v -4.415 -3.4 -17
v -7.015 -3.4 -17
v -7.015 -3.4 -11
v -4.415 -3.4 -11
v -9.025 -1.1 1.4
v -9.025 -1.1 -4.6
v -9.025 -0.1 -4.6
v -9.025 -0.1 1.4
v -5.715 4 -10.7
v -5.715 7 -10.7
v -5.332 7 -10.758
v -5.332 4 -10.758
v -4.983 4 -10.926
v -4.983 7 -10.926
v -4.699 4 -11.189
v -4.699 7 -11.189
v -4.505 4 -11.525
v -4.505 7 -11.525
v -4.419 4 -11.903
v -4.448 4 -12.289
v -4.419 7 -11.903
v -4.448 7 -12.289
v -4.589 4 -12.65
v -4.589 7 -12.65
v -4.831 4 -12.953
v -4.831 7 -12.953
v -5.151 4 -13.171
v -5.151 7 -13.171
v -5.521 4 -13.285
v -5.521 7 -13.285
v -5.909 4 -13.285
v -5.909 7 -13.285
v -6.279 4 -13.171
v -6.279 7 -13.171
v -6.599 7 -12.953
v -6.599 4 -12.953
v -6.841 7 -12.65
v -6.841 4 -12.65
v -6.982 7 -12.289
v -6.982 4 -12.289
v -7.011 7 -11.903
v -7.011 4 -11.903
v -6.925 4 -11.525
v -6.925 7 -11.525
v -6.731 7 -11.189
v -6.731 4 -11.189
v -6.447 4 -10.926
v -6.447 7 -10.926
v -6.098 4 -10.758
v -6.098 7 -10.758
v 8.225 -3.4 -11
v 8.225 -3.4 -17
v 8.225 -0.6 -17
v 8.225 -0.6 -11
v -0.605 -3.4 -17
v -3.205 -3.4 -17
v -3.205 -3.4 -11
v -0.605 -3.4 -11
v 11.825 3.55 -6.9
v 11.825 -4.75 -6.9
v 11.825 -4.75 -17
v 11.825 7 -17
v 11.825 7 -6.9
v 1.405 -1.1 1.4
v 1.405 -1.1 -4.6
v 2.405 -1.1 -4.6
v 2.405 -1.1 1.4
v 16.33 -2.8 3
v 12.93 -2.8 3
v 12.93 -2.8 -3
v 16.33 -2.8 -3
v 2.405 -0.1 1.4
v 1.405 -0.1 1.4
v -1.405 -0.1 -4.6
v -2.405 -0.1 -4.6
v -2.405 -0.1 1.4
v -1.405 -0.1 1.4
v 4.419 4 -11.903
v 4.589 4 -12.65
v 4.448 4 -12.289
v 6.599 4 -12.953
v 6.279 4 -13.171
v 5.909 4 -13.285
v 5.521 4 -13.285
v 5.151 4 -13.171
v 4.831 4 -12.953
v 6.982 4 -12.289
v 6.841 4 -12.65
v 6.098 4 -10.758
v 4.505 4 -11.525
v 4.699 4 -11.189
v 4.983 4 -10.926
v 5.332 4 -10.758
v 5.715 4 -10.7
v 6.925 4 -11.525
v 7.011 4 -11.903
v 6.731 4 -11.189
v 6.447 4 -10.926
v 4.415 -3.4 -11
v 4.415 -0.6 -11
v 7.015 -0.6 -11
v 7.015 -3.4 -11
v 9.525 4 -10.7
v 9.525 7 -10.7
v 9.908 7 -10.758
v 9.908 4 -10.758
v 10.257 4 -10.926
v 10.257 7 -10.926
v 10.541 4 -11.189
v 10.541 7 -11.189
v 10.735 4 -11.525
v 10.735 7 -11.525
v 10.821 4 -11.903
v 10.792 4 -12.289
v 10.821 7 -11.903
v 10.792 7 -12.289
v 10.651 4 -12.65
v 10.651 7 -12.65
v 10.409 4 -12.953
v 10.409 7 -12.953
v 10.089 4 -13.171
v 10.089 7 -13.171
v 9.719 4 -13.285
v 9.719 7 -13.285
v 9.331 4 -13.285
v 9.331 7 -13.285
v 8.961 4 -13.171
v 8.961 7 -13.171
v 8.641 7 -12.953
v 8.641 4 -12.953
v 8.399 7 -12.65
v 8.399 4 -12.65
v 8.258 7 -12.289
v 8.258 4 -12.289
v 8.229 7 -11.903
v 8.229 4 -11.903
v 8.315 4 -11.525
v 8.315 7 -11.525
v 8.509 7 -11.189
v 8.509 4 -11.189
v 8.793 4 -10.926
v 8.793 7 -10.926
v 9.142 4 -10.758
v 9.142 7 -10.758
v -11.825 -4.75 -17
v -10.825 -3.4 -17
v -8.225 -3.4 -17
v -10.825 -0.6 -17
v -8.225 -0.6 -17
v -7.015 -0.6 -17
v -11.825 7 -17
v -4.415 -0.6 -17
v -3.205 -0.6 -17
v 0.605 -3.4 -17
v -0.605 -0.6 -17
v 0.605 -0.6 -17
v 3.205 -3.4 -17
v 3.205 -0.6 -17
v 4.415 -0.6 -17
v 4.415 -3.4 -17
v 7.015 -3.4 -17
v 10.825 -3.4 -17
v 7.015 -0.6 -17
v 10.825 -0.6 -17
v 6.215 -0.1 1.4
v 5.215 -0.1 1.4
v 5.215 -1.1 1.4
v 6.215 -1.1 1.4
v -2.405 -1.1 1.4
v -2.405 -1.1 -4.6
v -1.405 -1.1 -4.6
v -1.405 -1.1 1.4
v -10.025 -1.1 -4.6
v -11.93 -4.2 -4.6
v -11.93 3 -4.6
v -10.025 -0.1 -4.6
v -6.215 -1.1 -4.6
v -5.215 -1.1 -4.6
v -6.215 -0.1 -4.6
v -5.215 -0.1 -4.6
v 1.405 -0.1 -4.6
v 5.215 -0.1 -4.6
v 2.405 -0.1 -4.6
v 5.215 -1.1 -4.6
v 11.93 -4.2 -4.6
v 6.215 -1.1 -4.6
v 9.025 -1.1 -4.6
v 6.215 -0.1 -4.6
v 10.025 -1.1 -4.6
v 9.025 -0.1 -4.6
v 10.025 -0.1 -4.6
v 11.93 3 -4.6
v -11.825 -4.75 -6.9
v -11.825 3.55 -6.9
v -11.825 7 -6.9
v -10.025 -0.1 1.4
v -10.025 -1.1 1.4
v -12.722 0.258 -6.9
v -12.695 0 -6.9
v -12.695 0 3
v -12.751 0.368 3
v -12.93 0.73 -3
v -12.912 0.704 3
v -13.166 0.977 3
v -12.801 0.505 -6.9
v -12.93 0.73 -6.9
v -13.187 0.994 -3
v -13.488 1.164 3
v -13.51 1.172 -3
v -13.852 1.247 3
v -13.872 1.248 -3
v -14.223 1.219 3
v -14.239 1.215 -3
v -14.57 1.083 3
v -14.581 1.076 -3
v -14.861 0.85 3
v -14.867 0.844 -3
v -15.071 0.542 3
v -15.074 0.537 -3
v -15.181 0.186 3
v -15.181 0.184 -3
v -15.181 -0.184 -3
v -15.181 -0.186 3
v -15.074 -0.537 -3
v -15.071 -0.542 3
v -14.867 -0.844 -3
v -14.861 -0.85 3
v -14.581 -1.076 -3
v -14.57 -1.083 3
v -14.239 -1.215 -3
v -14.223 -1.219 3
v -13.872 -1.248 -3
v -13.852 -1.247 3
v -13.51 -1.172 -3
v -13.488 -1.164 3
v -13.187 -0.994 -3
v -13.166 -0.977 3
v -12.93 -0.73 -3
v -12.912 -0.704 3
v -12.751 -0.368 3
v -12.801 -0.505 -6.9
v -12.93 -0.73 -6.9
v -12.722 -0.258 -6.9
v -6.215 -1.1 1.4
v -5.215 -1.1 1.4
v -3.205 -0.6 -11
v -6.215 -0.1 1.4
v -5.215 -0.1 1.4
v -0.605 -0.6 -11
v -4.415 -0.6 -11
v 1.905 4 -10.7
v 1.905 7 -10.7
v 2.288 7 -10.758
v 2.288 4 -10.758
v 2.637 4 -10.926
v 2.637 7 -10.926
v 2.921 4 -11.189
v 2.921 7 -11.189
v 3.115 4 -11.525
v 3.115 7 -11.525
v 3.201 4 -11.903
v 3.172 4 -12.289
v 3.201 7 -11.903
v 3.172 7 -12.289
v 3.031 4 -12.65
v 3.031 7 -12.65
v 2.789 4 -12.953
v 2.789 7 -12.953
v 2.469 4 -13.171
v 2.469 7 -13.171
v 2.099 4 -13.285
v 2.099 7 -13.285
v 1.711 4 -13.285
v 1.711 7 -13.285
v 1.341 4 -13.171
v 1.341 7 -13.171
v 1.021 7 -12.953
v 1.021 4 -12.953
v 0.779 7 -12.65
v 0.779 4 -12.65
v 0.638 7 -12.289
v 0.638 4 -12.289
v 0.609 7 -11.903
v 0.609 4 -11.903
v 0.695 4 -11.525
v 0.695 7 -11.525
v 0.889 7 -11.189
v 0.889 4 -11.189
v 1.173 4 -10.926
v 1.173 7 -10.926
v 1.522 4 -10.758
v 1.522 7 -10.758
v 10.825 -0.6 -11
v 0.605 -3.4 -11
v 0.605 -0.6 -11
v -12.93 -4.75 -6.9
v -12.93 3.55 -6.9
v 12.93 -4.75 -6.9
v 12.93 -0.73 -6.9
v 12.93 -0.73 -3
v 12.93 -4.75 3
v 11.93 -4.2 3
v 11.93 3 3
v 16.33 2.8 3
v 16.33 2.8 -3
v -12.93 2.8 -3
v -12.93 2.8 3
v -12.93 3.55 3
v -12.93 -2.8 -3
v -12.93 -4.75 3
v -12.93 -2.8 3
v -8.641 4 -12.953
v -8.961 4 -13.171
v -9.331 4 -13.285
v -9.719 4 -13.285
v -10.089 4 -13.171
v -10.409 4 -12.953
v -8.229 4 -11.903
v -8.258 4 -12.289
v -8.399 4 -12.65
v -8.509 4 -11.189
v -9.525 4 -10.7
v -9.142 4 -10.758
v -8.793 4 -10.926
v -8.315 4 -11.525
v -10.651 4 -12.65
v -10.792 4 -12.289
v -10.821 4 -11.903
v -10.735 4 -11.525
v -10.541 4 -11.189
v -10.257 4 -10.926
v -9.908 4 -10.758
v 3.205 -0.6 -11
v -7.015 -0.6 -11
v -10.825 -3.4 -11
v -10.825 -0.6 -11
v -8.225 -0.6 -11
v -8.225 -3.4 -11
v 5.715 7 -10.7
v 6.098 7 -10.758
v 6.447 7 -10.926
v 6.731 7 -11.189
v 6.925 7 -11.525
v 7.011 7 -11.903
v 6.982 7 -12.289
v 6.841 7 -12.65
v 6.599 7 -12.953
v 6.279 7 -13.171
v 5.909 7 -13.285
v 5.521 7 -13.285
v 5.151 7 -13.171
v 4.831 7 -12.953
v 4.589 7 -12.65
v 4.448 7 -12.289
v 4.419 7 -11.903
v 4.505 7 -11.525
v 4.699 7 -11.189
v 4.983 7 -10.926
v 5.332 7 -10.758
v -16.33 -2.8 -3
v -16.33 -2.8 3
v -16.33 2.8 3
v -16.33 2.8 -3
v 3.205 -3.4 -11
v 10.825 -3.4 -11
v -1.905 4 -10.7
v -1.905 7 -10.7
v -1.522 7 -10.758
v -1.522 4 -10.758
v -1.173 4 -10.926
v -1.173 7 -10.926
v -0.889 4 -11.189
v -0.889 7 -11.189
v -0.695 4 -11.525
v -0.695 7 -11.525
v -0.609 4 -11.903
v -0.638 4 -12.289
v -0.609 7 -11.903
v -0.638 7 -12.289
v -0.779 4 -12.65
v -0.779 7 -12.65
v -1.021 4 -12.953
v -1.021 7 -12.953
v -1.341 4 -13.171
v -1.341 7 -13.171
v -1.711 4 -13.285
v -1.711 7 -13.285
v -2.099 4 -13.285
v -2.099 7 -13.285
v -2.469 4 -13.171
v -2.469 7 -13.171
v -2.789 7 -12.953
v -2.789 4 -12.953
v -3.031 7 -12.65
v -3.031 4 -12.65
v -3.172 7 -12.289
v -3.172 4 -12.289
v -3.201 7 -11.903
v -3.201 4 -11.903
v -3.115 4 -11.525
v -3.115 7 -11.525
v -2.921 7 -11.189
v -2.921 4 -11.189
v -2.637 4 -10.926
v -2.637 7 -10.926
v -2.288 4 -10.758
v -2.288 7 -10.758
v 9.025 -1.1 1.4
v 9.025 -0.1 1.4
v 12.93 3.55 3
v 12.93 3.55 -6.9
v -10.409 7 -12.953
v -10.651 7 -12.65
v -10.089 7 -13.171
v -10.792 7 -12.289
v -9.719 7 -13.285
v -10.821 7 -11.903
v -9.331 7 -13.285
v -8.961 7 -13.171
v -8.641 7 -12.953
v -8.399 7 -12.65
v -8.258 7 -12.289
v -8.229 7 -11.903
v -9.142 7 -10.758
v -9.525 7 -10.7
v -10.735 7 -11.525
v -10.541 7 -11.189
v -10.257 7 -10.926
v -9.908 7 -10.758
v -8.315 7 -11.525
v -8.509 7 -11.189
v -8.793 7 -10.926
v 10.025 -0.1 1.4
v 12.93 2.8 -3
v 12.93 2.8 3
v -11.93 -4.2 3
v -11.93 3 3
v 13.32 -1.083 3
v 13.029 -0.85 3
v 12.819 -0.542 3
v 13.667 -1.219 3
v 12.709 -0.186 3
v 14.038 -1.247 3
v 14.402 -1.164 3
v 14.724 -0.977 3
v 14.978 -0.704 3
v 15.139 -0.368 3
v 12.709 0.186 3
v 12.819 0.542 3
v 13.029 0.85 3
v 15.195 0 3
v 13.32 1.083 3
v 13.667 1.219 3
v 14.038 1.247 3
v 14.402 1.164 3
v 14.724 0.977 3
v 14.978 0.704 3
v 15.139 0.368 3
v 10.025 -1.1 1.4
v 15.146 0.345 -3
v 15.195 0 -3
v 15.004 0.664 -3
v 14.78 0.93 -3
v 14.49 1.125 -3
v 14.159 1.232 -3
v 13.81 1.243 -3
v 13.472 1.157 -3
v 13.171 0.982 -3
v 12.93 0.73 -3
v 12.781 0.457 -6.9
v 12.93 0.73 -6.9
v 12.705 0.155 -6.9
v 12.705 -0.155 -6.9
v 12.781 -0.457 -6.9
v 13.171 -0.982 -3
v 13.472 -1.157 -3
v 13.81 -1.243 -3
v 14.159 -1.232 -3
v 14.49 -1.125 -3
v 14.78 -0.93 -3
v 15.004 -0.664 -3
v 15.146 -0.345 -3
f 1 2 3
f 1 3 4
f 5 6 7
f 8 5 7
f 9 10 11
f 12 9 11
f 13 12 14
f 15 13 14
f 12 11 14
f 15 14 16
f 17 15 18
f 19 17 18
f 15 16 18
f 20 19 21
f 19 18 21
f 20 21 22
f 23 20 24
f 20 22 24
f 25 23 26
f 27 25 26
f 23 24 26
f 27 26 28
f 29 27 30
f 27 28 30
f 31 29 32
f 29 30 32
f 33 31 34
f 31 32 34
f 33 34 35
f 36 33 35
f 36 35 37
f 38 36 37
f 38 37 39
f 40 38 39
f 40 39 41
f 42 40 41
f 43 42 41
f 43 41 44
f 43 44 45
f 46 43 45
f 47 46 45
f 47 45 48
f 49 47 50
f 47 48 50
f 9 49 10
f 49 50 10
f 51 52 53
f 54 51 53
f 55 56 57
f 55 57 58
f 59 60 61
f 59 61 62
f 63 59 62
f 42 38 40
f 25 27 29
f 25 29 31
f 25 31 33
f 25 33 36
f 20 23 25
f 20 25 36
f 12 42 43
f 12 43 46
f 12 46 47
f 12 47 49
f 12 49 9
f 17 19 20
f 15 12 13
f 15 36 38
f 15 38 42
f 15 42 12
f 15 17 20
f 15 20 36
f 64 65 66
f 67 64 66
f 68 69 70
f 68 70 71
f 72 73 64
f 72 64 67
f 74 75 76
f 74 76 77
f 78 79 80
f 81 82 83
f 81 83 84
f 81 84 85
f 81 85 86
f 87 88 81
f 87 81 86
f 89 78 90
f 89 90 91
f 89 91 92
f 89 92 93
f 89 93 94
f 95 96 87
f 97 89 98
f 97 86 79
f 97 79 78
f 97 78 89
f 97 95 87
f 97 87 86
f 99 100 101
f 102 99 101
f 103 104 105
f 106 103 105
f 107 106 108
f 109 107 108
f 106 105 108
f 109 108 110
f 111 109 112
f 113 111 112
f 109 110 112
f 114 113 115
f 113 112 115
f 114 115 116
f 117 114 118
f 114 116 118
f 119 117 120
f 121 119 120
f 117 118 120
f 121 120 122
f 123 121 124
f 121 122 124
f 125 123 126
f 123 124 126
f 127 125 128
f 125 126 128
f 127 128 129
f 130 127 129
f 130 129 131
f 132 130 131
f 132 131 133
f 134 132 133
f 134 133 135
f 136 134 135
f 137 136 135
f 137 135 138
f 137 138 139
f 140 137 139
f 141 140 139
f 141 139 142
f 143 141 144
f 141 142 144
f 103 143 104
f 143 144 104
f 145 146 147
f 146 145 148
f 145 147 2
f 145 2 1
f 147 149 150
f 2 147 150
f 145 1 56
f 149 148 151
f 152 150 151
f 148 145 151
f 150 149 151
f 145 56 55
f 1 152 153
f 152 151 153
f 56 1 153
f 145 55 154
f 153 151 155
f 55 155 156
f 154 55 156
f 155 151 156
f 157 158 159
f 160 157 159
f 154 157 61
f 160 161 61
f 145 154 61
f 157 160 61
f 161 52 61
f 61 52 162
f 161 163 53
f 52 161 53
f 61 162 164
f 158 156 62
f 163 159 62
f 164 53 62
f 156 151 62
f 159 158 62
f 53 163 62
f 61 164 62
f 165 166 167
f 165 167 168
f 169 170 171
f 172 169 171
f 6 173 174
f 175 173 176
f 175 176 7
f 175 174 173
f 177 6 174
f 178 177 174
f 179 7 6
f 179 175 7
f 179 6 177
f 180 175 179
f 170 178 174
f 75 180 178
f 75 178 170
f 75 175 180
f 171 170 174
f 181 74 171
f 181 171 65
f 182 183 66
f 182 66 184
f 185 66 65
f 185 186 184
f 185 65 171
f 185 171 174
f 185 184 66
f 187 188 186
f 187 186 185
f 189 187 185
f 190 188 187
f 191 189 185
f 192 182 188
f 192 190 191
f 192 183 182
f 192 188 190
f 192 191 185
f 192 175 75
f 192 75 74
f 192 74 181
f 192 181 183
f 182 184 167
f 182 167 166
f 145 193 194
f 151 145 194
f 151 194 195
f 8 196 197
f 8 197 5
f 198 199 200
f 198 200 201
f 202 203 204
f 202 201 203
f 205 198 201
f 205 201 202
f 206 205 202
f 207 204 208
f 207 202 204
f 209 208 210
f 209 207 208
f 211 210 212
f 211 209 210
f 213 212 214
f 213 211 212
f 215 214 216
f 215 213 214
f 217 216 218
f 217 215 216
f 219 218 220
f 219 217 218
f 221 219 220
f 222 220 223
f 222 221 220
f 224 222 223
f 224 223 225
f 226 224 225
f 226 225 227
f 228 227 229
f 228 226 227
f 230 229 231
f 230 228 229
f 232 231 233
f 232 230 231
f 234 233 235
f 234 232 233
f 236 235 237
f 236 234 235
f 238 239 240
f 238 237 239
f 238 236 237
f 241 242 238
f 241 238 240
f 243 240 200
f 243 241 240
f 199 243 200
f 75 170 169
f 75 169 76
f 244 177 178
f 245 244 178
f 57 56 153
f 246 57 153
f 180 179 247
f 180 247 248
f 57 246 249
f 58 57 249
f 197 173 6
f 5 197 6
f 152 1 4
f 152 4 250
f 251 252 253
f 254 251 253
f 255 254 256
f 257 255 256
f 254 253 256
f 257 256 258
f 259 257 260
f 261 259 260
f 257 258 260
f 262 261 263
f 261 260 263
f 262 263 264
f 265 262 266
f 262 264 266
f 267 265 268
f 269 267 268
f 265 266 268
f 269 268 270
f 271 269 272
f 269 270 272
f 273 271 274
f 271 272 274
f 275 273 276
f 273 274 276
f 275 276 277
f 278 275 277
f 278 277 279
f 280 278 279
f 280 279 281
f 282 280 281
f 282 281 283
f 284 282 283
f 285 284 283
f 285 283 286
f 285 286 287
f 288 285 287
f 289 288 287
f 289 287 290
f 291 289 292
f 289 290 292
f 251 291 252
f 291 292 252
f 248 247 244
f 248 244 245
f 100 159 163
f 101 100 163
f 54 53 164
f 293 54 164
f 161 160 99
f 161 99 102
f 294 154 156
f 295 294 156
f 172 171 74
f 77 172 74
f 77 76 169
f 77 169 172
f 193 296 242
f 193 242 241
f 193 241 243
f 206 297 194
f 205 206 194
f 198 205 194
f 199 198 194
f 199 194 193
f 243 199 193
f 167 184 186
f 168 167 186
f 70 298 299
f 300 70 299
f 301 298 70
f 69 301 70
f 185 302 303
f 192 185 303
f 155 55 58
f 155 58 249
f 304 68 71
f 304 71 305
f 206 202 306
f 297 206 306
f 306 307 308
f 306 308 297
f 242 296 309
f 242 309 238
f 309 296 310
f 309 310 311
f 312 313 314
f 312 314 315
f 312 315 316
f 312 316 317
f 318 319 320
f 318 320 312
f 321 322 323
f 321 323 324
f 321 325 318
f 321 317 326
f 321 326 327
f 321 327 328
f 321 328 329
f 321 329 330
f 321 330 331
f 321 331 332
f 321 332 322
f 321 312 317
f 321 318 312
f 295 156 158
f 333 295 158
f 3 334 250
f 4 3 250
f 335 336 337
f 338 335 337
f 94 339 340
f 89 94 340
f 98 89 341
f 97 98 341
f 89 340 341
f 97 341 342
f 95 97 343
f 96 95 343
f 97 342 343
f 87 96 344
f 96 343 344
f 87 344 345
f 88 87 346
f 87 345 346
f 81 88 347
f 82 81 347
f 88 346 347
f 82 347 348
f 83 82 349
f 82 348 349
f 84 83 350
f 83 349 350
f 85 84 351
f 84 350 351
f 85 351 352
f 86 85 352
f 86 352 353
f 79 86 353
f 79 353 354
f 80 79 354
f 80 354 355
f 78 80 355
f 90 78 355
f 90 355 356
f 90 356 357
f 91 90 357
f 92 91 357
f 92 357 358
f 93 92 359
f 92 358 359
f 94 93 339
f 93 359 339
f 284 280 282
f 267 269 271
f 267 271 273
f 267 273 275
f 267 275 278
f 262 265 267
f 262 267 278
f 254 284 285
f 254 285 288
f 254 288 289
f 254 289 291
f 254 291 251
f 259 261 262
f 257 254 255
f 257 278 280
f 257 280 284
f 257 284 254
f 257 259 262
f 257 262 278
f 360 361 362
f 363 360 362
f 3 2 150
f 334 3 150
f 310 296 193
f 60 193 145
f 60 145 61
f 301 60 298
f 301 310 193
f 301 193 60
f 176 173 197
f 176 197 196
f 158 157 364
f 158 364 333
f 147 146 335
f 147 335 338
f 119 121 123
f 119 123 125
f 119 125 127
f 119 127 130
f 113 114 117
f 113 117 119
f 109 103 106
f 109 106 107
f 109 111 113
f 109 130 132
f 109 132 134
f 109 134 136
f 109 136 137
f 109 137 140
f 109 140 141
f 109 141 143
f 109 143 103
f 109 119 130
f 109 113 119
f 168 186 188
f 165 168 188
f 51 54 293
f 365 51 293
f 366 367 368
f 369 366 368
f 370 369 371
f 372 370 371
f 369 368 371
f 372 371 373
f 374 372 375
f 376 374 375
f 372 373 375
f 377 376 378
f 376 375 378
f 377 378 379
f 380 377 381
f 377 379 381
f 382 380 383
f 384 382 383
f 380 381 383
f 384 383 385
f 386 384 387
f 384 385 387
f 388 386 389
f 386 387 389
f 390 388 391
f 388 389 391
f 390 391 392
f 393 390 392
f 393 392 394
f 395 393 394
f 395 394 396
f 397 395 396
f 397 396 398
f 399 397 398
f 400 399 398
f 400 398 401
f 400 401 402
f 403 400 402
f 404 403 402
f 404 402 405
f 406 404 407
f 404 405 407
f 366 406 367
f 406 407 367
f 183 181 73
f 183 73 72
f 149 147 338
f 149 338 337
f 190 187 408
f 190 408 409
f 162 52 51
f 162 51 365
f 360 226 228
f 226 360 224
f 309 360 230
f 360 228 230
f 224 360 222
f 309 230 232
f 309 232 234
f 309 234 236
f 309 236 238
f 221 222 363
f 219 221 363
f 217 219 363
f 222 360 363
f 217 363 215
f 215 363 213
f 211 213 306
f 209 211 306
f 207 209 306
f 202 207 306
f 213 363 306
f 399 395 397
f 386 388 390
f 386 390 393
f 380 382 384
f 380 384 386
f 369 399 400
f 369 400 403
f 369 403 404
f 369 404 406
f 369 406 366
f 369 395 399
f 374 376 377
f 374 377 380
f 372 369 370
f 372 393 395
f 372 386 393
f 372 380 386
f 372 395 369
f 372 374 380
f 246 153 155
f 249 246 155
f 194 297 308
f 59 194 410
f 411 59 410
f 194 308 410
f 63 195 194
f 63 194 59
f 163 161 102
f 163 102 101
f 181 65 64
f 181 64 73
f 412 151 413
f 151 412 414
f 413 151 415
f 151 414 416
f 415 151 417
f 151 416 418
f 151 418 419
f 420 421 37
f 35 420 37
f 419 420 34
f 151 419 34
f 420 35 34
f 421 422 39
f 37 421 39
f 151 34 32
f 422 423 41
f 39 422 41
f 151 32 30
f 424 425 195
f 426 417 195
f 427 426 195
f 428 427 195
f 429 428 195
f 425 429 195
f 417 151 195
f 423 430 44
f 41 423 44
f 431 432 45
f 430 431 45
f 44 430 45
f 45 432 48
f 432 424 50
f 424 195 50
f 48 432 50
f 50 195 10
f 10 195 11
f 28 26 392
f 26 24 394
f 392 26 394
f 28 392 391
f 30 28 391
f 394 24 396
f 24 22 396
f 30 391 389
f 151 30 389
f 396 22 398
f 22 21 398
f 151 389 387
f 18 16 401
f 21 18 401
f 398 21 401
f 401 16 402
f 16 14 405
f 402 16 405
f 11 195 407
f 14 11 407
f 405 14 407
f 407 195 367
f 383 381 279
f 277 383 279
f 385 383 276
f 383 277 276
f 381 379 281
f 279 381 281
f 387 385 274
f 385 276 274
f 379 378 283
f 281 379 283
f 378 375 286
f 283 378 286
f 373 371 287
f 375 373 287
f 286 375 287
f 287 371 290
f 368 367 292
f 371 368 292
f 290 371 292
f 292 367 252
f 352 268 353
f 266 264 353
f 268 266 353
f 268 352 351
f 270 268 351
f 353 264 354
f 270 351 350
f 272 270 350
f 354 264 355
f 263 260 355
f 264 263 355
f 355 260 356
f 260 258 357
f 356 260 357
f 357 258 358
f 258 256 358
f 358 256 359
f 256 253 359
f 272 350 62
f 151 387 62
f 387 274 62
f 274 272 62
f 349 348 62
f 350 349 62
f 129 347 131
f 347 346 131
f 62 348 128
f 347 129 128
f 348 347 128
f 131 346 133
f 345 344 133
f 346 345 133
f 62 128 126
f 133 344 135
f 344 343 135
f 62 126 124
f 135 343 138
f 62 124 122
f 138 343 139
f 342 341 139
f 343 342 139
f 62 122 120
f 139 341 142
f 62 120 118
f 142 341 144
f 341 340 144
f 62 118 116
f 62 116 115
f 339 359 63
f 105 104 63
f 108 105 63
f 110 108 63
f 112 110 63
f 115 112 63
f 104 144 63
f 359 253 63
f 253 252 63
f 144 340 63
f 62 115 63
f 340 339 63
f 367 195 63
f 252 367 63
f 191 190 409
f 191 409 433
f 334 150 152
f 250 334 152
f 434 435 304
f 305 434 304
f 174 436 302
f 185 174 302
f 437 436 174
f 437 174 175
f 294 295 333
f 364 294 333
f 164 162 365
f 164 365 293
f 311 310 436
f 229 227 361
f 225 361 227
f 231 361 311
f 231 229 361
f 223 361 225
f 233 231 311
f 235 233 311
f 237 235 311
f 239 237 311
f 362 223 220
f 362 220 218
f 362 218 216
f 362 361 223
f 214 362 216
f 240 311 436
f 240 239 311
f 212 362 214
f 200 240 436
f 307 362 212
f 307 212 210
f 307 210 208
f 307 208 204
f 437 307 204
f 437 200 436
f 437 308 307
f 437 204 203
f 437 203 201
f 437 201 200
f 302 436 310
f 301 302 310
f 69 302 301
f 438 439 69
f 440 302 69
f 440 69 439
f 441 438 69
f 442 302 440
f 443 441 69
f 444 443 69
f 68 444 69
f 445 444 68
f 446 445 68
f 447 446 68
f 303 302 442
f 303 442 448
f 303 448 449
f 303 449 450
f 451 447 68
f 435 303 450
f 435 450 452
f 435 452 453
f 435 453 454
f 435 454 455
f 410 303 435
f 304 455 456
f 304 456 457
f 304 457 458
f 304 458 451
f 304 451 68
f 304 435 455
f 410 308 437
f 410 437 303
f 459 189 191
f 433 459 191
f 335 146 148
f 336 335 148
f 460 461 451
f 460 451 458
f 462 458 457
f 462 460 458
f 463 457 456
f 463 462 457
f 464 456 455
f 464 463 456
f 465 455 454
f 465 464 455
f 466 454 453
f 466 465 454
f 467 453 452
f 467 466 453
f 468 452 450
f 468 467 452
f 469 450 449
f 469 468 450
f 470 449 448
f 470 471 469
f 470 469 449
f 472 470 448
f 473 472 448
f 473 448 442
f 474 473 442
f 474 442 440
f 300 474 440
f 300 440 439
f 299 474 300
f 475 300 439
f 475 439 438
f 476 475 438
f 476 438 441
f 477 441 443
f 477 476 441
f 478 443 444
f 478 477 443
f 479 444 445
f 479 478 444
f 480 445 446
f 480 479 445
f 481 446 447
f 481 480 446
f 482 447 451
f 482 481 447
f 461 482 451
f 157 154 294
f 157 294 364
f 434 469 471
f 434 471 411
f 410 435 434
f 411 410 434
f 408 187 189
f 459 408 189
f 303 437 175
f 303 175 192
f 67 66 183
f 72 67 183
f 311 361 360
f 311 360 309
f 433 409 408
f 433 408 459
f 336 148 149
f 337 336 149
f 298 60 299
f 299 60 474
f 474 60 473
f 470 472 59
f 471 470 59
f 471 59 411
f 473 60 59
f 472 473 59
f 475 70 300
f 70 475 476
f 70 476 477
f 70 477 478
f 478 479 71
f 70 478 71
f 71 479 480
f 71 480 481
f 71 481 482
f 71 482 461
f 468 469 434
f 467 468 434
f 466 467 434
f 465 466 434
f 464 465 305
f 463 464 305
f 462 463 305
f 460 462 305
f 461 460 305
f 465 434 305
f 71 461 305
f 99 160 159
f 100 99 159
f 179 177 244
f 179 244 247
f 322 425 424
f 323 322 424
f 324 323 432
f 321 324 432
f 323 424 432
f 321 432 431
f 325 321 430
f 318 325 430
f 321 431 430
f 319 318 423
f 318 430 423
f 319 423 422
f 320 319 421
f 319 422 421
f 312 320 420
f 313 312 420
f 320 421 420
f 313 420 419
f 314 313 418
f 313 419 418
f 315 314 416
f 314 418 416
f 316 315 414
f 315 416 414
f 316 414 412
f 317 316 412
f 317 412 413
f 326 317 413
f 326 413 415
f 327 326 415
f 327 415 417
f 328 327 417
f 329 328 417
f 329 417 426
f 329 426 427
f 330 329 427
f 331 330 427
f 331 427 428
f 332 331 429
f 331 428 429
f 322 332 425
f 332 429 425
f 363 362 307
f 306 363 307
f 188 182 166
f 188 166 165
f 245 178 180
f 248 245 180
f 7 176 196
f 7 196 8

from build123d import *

# Parameters (mm, degrees)
SK_SHROUD_W             = 25.86
SK_SHROUD_H             = 8.3
SHROUD_DEPTH            = 9.9
SK_FLANGE_EARS_W        = 3.4
SK_FLANGE_EARS_H        = 5.6
FLANGE_EARS_DEPTH       = 6
SK_CAVITY_W             = 23.86
SK_CAVITY_H             = 7.2
CAVITY_DEPTH            = 7.6
SK_TERMINAL_BLOCK_W     = 23.65
SK_TERMINAL_BLOCK_H     = 11.75
TERMINAL_BLOCK_DEPTH    = 10.1
INSERT_HOLES_DEPTH      = 25.590016267
INSERT_HOLES_DEPTH_BACK = 25.590016267
SK_INSERT_HOLES_R       = 1.25
SK_CONTACT_PINS_W       = 1
SK_CONTACT_PINS_H       = 1
CONTACT_PINS_DEPTH      = 6
SK_WIRE_ENTRIES_W       = 2.6
SK_WIRE_ENTRIES_H       = 2.8
WIRE_ENTRIES_DEPTH      = 6
SK_CLAMP_SCREW_HOLES_R  = 1.3
CLAMP_SCREW_HOLES_DEPTH = 3


with BuildPart() as part:
    # SK Shroud → Shroud (new body)
    with BuildSketch(Plane.XY.offset(3)):
        with Locations((0, -0.6)):
            Rectangle(SK_SHROUD_W, SK_SHROUD_H)
    extrude(amount=-SHROUD_DEPTH)

    # SK Flange ears → Flange ears (add)
    with BuildSketch(Plane.XY.offset(3)):
        with Locations((14.63, 0)):
            Rectangle(SK_FLANGE_EARS_W, SK_FLANGE_EARS_H)
        with Locations((-14.63, 0)):
            Rectangle(SK_FLANGE_EARS_W, SK_FLANGE_EARS_H)
    extrude(amount=-FLANGE_EARS_DEPTH)

    # SK Cavity → Cavity (cut)
    with BuildSketch(Plane.XY.offset(3)):
        with Locations((0, -0.6)):
            Rectangle(SK_CAVITY_W, SK_CAVITY_H)
    extrude(amount=-CAVITY_DEPTH, mode=Mode.SUBTRACT)

    # SK Terminal block → Terminal block (add)
    with BuildSketch(Plane.XY.offset(-6.9)):
        with Locations((0, 1.125)):
            Rectangle(SK_TERMINAL_BLOCK_W, SK_TERMINAL_BLOCK_H)
    extrude(amount=-TERMINAL_BLOCK_DEPTH)

    # SK Insert holes → Insert holes (cut, two sides: drawn at the far end of the back side and taken through both)
    with BuildSketch(Plane.XY.offset(-INSERT_HOLES_DEPTH_BACK)):
        with Locations((-13.945, 0)):
            Circle(SK_INSERT_HOLES_R)
        with Locations((13.945, 0)):
            Circle(SK_INSERT_HOLES_R)
    extrude(amount=INSERT_HOLES_DEPTH + INSERT_HOLES_DEPTH_BACK, mode=Mode.SUBTRACT)

    # SK Contact pins → Contact pins (add)
    with BuildSketch(Plane.XY.offset(-4.6)):
        with Locations((-9.525, -0.6)):
            Rectangle(SK_CONTACT_PINS_W, SK_CONTACT_PINS_H)
        with Locations((-5.715, -0.6)):
            Rectangle(SK_CONTACT_PINS_W, SK_CONTACT_PINS_H)
        with Locations((-1.905, -0.6)):
            Rectangle(SK_CONTACT_PINS_W, SK_CONTACT_PINS_H)
        with Locations((1.905, -0.6)):
            Rectangle(SK_CONTACT_PINS_W, SK_CONTACT_PINS_H)
        with Locations((5.715, -0.6)):
            Rectangle(SK_CONTACT_PINS_W, SK_CONTACT_PINS_H)
        with Locations((9.525, -0.6)):
            Rectangle(SK_CONTACT_PINS_W, SK_CONTACT_PINS_H)
    extrude(amount=CONTACT_PINS_DEPTH)

    # SK Wire entries → Wire entries (cut)
    with BuildSketch(Plane.XY.offset(-17)):
        with Locations((-9.525, -2)):
            Rectangle(SK_WIRE_ENTRIES_W, SK_WIRE_ENTRIES_H)
        with Locations((-5.715, -2)):
            Rectangle(SK_WIRE_ENTRIES_W, SK_WIRE_ENTRIES_H)
        with Locations((-1.905, -2)):
            Rectangle(SK_WIRE_ENTRIES_W, SK_WIRE_ENTRIES_H)
        with Locations((1.905, -2)):
            Rectangle(SK_WIRE_ENTRIES_W, SK_WIRE_ENTRIES_H)
        with Locations((5.715, -2)):
            Rectangle(SK_WIRE_ENTRIES_W, SK_WIRE_ENTRIES_H)
        with Locations((9.525, -2)):
            Rectangle(SK_WIRE_ENTRIES_W, SK_WIRE_ENTRIES_H)
    extrude(amount=WIRE_ENTRIES_DEPTH, mode=Mode.SUBTRACT)

    # SK Clamp screw holes → Clamp screw holes (cut)
    with BuildSketch(Plane(origin=(0, 7, 0), x_dir=(1, 0, 0), z_dir=(0, 1, 0))):
        with Locations(Location((-9.525, 12, 0), (0, 0, 270))):
            Circle(SK_CLAMP_SCREW_HOLES_R)
        with Locations(Location((-5.715, 12, 0), (0, 0, 270))):
            Circle(SK_CLAMP_SCREW_HOLES_R)
        with Locations(Location((-1.905, 12, 0), (0, 0, 270))):
            Circle(SK_CLAMP_SCREW_HOLES_R)
        with Locations(Location((1.905, 12, 0), (0, 0, 270))):
            Circle(SK_CLAMP_SCREW_HOLES_R)
        with Locations(Location((5.715, 12, 0), (0, 0, 270))):
            Circle(SK_CLAMP_SCREW_HOLES_R)
        with Locations(Location((9.525, 12, 0), (0, 0, 270))):
            Circle(SK_CLAMP_SCREW_HOLES_R)
    extrude(amount=-CLAMP_SCREW_HOLES_DEPTH, mode=Mode.SUBTRACT)


solid = part.part
